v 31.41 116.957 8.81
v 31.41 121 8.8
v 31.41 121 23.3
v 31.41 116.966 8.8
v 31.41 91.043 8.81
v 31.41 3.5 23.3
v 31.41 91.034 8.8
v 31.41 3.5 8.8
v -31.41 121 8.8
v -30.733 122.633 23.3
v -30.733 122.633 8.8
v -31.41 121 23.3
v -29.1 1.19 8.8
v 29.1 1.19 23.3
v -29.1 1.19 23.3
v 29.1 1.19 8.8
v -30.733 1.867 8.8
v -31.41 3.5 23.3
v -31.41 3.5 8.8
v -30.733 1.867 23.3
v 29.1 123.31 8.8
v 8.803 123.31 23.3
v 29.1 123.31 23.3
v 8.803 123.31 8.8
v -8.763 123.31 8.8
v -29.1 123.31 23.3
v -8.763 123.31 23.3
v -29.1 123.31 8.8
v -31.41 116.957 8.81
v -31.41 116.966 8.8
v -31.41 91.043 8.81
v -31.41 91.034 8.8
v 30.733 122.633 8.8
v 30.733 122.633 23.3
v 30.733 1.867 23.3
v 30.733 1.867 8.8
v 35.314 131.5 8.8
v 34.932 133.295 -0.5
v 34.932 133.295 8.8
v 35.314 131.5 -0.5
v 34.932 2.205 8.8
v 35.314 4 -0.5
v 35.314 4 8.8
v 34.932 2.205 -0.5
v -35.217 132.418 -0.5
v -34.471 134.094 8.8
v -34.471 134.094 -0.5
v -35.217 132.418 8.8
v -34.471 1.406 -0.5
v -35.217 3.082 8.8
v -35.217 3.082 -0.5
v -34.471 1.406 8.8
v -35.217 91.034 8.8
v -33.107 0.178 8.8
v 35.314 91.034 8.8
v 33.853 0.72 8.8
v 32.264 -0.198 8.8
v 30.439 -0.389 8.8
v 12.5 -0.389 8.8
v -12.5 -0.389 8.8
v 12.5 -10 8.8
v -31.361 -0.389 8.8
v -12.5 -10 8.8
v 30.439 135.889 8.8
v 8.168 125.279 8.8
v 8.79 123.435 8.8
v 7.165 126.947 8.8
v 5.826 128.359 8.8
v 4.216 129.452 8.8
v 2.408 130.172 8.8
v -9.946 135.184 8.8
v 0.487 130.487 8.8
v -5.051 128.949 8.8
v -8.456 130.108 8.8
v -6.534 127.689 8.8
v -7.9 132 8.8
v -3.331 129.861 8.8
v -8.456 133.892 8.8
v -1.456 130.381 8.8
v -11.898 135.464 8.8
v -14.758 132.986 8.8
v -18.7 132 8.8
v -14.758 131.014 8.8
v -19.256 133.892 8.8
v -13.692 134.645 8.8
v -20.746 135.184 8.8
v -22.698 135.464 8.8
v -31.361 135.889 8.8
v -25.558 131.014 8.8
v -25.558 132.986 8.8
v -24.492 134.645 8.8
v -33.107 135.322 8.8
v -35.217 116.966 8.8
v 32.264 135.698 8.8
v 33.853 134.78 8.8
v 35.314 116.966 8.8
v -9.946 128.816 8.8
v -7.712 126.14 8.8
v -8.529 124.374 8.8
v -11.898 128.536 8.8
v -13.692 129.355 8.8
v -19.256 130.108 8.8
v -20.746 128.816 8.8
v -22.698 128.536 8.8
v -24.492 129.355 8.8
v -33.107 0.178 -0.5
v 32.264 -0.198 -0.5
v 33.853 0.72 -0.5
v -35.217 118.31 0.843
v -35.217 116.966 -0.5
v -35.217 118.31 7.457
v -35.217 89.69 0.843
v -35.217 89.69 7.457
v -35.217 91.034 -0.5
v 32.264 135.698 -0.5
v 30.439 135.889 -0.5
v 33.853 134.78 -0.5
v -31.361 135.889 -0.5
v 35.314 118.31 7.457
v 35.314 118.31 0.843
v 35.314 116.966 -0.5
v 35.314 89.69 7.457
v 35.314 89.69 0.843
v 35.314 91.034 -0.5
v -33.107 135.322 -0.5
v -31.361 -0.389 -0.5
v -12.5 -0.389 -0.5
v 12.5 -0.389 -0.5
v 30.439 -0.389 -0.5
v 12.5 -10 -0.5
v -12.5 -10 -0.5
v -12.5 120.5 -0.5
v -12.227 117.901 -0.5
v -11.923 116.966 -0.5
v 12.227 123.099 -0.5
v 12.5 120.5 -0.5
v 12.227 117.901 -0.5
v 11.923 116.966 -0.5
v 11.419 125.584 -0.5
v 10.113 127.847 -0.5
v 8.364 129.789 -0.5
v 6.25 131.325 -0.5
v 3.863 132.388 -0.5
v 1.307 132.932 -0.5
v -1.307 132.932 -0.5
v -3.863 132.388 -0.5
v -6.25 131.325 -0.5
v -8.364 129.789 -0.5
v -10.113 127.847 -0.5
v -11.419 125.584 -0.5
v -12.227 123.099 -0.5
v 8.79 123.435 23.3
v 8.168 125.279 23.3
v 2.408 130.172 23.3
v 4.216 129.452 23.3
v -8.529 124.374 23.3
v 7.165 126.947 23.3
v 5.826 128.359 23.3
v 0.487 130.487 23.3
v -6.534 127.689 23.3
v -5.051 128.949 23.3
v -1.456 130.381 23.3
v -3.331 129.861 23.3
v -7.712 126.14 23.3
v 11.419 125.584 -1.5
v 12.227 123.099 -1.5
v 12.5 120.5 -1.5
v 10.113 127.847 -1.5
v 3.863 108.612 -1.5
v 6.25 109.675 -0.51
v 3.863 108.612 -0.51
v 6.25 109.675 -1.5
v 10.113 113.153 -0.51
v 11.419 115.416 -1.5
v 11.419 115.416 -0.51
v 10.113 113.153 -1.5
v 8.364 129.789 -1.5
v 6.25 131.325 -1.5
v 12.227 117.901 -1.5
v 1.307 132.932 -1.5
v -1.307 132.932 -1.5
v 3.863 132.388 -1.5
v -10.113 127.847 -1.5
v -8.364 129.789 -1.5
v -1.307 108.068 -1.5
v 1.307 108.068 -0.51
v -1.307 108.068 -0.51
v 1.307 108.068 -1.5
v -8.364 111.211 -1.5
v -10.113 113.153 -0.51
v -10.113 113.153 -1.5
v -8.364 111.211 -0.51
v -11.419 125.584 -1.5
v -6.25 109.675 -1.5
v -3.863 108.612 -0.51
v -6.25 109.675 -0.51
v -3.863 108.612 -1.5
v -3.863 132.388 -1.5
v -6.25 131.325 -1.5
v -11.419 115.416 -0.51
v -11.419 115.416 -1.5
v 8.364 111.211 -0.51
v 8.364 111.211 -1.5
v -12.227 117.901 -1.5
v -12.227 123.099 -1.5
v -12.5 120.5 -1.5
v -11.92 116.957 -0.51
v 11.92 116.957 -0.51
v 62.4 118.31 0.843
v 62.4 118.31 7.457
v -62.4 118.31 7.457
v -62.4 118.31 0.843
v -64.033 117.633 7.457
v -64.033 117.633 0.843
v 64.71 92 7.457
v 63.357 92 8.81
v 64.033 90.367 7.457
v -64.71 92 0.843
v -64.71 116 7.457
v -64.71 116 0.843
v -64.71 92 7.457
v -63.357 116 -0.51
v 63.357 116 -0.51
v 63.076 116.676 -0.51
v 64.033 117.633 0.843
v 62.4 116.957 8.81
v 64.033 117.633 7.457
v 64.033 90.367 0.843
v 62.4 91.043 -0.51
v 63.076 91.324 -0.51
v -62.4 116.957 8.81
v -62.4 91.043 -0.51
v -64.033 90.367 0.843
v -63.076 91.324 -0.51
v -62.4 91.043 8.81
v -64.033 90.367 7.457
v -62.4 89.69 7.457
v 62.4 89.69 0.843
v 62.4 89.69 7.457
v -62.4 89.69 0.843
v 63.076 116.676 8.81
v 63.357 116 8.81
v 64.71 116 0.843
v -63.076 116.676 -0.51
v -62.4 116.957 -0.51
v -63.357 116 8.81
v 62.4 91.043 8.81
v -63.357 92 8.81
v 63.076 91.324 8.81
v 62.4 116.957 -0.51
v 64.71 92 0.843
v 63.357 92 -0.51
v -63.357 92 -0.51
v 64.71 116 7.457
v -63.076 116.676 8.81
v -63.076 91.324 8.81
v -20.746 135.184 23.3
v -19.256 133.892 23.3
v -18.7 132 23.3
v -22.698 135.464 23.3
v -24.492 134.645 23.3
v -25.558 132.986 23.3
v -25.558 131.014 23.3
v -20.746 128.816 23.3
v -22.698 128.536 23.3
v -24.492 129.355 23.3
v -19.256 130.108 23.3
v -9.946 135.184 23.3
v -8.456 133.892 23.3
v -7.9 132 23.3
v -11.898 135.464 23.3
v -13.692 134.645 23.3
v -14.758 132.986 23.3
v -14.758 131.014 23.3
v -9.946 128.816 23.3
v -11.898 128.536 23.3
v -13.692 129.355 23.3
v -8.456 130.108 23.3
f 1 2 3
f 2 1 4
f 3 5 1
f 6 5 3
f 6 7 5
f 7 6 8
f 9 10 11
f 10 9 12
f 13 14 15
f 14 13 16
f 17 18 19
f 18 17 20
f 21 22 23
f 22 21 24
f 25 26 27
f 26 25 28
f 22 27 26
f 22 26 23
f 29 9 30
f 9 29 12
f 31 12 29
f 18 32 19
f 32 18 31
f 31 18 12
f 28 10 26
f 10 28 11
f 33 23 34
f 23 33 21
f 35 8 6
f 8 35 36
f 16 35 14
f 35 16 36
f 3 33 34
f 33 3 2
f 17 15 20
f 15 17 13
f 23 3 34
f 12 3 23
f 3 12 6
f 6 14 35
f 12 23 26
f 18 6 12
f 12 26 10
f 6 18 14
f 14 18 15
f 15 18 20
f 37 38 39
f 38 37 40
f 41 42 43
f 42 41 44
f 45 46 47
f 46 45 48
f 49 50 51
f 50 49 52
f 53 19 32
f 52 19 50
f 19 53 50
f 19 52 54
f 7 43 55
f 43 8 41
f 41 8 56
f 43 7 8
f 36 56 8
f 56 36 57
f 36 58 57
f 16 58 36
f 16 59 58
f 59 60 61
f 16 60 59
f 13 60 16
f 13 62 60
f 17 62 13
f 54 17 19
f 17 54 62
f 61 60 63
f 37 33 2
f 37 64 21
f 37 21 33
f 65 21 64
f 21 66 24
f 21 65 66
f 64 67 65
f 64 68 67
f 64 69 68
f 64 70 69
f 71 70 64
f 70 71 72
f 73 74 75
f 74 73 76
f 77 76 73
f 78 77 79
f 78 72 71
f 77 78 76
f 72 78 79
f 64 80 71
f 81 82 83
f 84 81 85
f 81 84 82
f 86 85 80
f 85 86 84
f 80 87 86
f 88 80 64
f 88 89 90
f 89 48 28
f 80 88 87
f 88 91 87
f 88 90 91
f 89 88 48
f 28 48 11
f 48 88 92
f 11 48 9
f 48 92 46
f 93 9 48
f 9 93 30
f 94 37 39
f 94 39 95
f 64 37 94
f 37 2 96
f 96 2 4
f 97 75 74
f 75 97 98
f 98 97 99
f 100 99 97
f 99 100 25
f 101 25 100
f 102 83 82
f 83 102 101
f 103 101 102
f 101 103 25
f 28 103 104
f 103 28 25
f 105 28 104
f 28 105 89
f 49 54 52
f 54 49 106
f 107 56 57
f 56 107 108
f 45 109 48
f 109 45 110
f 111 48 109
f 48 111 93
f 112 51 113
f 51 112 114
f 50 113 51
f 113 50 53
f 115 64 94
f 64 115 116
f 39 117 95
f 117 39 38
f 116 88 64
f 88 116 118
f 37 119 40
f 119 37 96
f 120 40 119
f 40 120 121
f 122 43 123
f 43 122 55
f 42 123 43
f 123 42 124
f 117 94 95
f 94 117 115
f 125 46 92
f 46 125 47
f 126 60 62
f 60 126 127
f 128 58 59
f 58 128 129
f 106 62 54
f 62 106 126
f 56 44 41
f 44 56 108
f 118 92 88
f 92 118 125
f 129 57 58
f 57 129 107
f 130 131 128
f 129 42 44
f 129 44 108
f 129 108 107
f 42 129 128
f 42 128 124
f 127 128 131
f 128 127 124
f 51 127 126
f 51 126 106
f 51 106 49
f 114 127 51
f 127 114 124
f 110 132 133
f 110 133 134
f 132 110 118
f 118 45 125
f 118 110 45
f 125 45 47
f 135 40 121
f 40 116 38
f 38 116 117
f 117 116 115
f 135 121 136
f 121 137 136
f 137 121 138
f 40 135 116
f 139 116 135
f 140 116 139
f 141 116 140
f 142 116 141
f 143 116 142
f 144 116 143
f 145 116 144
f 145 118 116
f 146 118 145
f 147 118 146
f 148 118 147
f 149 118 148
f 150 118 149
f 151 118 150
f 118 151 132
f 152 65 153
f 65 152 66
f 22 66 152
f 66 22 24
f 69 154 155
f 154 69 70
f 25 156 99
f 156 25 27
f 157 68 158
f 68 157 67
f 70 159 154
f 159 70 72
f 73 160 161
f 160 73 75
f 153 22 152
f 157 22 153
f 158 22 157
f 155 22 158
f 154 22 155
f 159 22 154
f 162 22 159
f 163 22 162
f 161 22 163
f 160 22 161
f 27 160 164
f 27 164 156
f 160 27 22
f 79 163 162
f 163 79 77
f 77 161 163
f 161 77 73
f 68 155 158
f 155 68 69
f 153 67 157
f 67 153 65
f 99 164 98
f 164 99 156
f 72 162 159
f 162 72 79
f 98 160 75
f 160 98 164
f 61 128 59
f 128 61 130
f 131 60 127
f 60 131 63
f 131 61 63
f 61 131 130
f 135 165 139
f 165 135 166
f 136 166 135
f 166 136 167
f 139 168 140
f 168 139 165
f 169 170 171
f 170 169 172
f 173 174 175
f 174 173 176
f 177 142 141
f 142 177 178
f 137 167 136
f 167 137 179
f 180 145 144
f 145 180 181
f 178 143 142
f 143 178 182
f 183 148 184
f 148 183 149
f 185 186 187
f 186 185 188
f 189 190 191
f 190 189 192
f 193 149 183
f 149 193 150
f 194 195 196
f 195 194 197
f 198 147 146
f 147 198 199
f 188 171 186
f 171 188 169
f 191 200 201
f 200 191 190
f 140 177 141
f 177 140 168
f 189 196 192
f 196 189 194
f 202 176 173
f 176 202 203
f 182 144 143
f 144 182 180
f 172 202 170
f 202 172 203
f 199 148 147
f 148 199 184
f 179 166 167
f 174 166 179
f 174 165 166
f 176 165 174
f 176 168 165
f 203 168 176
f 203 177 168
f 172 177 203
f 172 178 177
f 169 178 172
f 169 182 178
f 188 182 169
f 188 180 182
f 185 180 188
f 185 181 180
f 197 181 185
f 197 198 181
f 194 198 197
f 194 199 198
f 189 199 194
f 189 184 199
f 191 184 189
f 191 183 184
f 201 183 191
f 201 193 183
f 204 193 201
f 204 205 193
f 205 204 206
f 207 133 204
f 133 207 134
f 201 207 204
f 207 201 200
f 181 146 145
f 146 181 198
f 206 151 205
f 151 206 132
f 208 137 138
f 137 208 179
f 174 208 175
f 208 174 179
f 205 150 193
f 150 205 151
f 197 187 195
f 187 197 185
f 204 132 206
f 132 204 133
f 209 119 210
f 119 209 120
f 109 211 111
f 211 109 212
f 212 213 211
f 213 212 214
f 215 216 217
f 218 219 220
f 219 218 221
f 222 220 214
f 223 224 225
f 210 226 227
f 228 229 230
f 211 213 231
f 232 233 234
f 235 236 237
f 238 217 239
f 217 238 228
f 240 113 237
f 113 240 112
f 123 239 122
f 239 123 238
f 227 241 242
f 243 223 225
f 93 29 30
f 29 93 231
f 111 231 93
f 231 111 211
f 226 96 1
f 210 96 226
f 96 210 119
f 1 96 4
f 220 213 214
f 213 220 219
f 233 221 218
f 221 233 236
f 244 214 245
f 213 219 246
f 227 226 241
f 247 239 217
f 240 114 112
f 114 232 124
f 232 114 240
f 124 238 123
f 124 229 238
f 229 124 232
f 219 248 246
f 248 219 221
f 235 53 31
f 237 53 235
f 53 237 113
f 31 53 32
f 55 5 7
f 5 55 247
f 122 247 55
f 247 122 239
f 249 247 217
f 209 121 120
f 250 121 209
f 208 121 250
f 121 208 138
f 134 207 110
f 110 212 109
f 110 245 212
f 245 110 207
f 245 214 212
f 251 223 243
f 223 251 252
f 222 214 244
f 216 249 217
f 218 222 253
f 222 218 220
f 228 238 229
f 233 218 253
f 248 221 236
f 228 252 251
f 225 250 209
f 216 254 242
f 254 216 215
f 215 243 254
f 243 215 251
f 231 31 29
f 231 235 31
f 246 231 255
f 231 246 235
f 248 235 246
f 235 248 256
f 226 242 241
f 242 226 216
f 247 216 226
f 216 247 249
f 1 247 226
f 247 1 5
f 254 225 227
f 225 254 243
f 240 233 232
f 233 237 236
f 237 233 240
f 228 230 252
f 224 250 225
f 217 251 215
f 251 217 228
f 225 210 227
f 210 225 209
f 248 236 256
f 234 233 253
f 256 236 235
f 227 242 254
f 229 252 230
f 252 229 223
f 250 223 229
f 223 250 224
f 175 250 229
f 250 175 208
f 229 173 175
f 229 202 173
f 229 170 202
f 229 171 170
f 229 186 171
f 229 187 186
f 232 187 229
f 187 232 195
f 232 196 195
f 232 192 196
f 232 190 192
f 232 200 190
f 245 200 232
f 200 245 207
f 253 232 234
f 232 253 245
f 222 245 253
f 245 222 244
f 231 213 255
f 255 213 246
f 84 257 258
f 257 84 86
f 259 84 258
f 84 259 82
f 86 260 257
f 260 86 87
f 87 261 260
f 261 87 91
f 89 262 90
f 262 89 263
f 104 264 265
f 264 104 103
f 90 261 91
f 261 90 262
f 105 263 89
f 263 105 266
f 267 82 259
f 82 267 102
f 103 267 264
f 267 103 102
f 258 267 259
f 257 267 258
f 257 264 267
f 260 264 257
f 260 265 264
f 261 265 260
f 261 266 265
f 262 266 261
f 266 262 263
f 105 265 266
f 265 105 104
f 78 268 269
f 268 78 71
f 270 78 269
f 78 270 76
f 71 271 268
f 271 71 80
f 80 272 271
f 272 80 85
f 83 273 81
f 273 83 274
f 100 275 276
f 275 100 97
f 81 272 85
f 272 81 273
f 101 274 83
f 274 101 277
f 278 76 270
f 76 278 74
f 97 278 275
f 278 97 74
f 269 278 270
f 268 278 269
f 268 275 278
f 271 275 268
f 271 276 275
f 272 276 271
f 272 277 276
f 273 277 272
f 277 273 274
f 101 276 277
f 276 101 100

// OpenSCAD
// file: roundedCube.scad
// Example:
roundedCube(
  x = 30,
  y = 20,
  z = 10,
  r = 3,
  flatBottom = true
);

module roundedCube(
  x,
  y,
  z,
  r = 0,
  flatTop = false,
  flatBottom = false,
  flatLeft = false,
  flatRight = false,
  flatFront = false,
  flatBack = false
) {

  // Calculate [ x, y, z ] compensations based on requested roundings:
  rX = r * (flatLeft && flatRight ? 0 : (flatLeft || flatRight ? 1 : 2));
  rY = r * (flatFront && flatBack ? 0 : (flatFront || flatBack ? 1 : 2));
  rZ = r * (flatTop && flatBottom ? 0 : (flatTop || flatBottom ? 1 : 2));

  // Do some sanity checks:
  if (x - rX <= 0) {
    echo("<b style='color: red'>WARNING</b>: roundedCube() is too small along its x-axis");
  }
  if (y - rY <= 0) {
    echo("<b style='color: red'>WARNING</b>: roundedCube() is too small along its y-axis");
  }
  if (z - rZ <= 0) {
    echo("<b style='color: red'>WARNING</b>: roundedCube() is too small along its z-axis");
  }

  difference() {

    // Main rounded cube:
    translate([
      flatLeft ? 0 : r,
      flatFront ? 0 : r,
      flatBottom ? 0 : r
    ]) {
      minkowski() {
        cube([
          x - rX,
          y - rY,
          z - rZ
        ]);
        sphere(r = r);
      }
    }

    // Optional cutouts:
    // (let's not generate unnecessary geometry)
    if (flatTop) {
      translate([ x / -2, y / -2, z ])
      cube([ x * 2, y * 2, z ]);
    }
    if (flatBottom) {
      translate([ x / -2, y / -2, -z ])
      cube([ x * 2, y * 2, z ]);
    }
    if (flatLeft) {
      translate([ -x, y / -2, z / -2 ])
      cube([ x, y * 2, z * 2 ]);
    }
    if (flatRight) {
      translate([ x, y / -2, z / -2 ])
      cube([ x, y * 2, z * 2 ]);
    }
    if (flatFront) {
      translate([ x / -2, -y, z / -2 ])
      cube([ x * 2, y, z * 2 ]);
    }
    if (flatBack) {
      translate([ x / -2, y, z / -2 ])
      cube([ x * 2, y, z * 2 ]);
    }

  }

}
// file: config.scad
OUTER_ROUNDING = 8;
INNER_ROUNDING = 3;

DEXCOM_WIDTH = 46.4;
DEXCOM_HEIGHT = 99.3;
DEXCOM_DEPTH = 13.0;
DEXCOM_ROUNDING = 3.5;

SAMSUNG_WIDTH = 69.8;
SAMSUNG_HEIGHT = 136.5 - 1; // the -1 compensates for the curvature of the bottom
SAMSUNG_DEPTH = 8.3;
SAMSUNG_CAM_BUMP_HEIGHT = 1.5; // actually measured: 0.7
SAMSUNG_BUTTONS_HEIGHT = 1; // actually measured: 0.5
SAMSUNG_ROUNDING = 4.5; // approximation was 7, but matching Mophie

MOPHIE_WIDTH = 69.3;
MOPHIE_HEIGHT = 119.3;
MOPHIE_DEPTH = 12.8;
MOPHIE_ROUNDING = 4.5; // approximation

RIG_WALL_THICKNESS = 3;
RIG_TRUNK_LENGTH = 65;
RIG_WIDTH = SAMSUNG_WIDTH + RIG_WALL_THICKNESS * 2;
// main file
include <config.scad>;

use <roundedCube.scad>;

// Example:
samsung(0.5);

module samsung(
  withTolerance = 0,
  bottomSpace = 10
) {

  // Main body:
  minkowski() {
    translate([ SAMSUNG_WIDTH / -2, 0, 0 ])
    roundedCube(
      SAMSUNG_WIDTH,
      SAMSUNG_HEIGHT,
      SAMSUNG_DEPTH,
      r = SAMSUNG_ROUNDING,
      flatTop = true,
      flatBottom = true
    );
    translate([ -withTolerance, -withTolerance, -withTolerance ])
    cube([ withTolerance * 2, withTolerance * 2, withTolerance * 2 ]);
  }

  // Screen access:
  screenHorMargin = 3.3;
  screenVerMargin = 12;
  screenBottomMargin = 1;
  screenSpace = 15;
  translate([ SAMSUNG_WIDTH / -2 + screenHorMargin, screenBottomMargin, SAMSUNG_DEPTH ])
  roundedCube(
    SAMSUNG_WIDTH - screenHorMargin * 2,
    SAMSUNG_HEIGHT - screenVerMargin - screenBottomMargin,
    screenSpace,
    r = 2.5,
    flatTop = true,
    flatBottom = true
  );

  // Top pulldown access:
  translate([ 0, SAMSUNG_HEIGHT - 14, SAMSUNG_DEPTH ])
  cylinder(r = 9, h = screenSpace);

  // Bottom access:
  bottomWidth = 25;
  bottomMargin = (SAMSUNG_WIDTH - bottomWidth) / 2;
  translate([ SAMSUNG_WIDTH / -2 + bottomMargin, -bottomSpace, -withTolerance ])
  cube([
    SAMSUNG_WIDTH - bottomMargin * 2,
    bottomSpace,
    SAMSUNG_DEPTH + withTolerance * 2
  ]);

  // Camera bump:
  cameraDiameter = 25;
  cameraDistance = 15;
  translate([
    cameraDiameter / -2 + cameraDiameter / 2,
    SAMSUNG_HEIGHT - cameraDistance,
    -SAMSUNG_CAM_BUMP_HEIGHT
  ])
  cylinder(r = cameraDiameter / 2, h = SAMSUNG_CAM_BUMP_HEIGHT);

  // Buttons access:
  buttonsSpace = 30;
  buttonsHeight = 46 - 17;
  buttonsVertExtra = 0.7;
  translate([
    SAMSUNG_WIDTH / -2 - buttonsSpace,
    SAMSUNG_HEIGHT - buttonsHeight - 17,
    -buttonsVertExtra
  ])
  roundedCube(
    SAMSUNG_WIDTH + buttonsSpace * 2, // note: use "* 2" to have the power button also accessible
    buttonsHeight,
    SAMSUNG_DEPTH + buttonsVertExtra * 2,
    r = 2.5
  );

  // Notification LED access:
  ledDiameter = 7;
  translate([ SAMSUNG_WIDTH / -2 + 12.7, SAMSUNG_HEIGHT - ledDiameter / 2, SAMSUNG_DEPTH ])
  color("blue")
  cylinder(r = ledDiameter / 2, h = screenSpace);

  // Ambient light sensor access:
  translate([ SAMSUNG_WIDTH / -2 + 23.5, SAMSUNG_HEIGHT - ledDiameter / 2, SAMSUNG_DEPTH ])
  color("blue")
  cylinder(r = ledDiameter / 2, h = screenSpace);

}
